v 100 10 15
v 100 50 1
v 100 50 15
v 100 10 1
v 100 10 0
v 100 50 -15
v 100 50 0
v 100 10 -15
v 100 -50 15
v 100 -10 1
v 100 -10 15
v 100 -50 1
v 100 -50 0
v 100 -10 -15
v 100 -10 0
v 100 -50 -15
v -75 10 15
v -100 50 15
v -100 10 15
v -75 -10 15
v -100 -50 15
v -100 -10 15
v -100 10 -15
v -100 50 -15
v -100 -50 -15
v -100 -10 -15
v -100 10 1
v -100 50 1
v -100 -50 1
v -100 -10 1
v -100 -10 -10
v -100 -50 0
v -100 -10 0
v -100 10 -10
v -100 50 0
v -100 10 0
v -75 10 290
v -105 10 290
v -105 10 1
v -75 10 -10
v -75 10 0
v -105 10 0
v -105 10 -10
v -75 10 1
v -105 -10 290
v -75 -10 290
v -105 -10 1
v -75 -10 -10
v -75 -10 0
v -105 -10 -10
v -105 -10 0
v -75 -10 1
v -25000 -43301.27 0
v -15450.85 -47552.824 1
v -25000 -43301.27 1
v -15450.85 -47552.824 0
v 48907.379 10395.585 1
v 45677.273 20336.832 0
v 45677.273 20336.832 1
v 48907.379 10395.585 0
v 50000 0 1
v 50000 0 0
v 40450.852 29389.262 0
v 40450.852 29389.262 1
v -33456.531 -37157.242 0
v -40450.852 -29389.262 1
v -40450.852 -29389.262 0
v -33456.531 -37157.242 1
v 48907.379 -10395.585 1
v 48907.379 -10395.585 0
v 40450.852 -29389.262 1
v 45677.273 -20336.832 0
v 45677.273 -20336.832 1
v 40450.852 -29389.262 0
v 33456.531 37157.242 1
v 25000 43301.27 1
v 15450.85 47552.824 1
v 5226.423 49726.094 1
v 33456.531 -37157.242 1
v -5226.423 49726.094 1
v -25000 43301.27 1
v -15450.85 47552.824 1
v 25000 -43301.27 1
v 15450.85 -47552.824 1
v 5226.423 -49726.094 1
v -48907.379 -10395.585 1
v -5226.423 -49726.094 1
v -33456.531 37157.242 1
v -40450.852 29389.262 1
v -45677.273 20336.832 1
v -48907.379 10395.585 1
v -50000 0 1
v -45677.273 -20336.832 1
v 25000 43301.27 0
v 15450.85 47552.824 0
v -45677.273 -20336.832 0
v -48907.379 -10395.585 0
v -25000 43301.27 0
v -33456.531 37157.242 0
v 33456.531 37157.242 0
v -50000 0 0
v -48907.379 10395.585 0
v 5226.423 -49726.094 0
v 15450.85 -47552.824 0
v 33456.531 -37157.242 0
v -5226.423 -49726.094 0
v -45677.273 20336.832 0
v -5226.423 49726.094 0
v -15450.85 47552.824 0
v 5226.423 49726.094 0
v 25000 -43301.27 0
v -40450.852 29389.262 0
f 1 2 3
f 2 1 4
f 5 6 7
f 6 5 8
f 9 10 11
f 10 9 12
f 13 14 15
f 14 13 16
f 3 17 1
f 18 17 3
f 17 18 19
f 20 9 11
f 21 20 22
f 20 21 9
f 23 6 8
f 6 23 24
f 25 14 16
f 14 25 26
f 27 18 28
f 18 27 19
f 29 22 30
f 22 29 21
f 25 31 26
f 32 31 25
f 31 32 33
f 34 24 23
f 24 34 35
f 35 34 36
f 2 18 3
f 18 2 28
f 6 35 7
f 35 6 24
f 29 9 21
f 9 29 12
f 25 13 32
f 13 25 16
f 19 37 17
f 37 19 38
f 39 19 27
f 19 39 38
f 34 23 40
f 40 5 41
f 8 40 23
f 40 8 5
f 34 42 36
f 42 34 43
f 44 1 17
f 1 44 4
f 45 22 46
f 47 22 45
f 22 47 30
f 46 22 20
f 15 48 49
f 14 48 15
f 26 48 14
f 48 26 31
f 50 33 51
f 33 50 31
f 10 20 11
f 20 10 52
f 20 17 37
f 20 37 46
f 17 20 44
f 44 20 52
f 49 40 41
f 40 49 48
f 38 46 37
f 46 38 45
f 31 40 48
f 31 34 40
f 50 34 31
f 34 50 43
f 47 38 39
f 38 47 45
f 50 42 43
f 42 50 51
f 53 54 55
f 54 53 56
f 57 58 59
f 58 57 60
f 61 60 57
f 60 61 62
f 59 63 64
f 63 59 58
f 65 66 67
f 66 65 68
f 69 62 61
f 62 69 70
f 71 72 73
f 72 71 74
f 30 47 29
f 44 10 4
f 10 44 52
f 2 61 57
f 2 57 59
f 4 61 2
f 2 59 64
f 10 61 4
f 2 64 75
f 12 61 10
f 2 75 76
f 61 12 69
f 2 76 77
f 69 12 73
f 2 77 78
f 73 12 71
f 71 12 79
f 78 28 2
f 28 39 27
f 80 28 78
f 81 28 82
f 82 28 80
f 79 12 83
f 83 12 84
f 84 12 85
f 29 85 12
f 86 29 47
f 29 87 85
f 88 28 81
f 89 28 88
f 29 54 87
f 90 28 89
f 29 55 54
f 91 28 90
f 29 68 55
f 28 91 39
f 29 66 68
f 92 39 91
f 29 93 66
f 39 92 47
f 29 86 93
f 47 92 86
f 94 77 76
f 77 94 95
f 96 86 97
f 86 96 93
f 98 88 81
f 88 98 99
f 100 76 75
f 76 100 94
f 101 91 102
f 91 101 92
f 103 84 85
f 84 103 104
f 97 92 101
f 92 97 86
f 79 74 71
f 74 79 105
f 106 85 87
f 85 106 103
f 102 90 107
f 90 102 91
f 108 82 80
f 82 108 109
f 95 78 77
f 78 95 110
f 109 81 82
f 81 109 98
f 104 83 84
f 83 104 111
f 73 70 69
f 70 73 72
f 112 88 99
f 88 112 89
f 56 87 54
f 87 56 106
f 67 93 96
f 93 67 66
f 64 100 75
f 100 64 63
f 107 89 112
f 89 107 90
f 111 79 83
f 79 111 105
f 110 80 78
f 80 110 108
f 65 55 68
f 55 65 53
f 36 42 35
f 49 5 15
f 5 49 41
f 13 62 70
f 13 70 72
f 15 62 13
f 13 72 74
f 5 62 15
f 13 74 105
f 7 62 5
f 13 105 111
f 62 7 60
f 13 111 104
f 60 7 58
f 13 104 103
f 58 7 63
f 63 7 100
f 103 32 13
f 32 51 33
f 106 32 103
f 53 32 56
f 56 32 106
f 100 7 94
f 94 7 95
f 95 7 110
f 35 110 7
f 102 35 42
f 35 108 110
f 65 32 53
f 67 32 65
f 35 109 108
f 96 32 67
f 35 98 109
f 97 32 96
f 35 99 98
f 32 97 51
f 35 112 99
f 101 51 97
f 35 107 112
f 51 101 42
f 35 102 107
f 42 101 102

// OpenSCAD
// Generated by SolidPython 1.1.1 on 2021-04-14 13:51:50


union() {
	difference() {
		cube(center = true, size = [200, 100, 30]);
		translate(v = [-100.0000000000, 0, 0]) {
			cube(center = true, size = [500, 20, 31]);
		}
	}
	translate(v = [0, 0, 140.0000000000]) {
		translate(v = [-90.0000000000, 0, 0]) {
			cube(center = true, size = [30, 20, 300]);
		}
	}
	cylinder(r = 50000);
}
/***********************************************
*********      SolidPython code:      **********
************************************************
 
import solid
import solid.utils

BASE_DIMENSIONS = [
    200, # X value
    100, # Y value
    30   # Z value
]

POLE_DIMENSIONS = [
    30,
    20,
    300
]

def make_shade():
    pass

def make_top():
    pass

def make_pole():
    pole = solid.cube(POLE_DIMENSIONS, center=True)
    pole = solid.utils.left((BASE_DIMENSIONS[0]/2) - 10)(pole)
    pole = solid.utils.up((((POLE_DIMENSIONS[2]/2) - BASE_DIMENSIONS[2]/2)) + 5)(pole)
    return pole

def make_base():
    base = solid.cube(BASE_DIMENSIONS, center=True)
    pole_hole = solid.cube([500, POLE_DIMENSIONS[1], BASE_DIMENSIONS[2]+1], center=True)
    pole_hole = solid.utils.left(BASE_DIMENSIONS[0]/2)(pole_hole)
    return base - pole_hole

def main():
    base = make_base()
    pole = make_pole()
    final_obj = base + pole + solid.cylinder(r=50000)
    solid.scad_render_to_file(final_obj, "model.scad")


if __name__ == "__main__":
    main() 
 
************************************************/
